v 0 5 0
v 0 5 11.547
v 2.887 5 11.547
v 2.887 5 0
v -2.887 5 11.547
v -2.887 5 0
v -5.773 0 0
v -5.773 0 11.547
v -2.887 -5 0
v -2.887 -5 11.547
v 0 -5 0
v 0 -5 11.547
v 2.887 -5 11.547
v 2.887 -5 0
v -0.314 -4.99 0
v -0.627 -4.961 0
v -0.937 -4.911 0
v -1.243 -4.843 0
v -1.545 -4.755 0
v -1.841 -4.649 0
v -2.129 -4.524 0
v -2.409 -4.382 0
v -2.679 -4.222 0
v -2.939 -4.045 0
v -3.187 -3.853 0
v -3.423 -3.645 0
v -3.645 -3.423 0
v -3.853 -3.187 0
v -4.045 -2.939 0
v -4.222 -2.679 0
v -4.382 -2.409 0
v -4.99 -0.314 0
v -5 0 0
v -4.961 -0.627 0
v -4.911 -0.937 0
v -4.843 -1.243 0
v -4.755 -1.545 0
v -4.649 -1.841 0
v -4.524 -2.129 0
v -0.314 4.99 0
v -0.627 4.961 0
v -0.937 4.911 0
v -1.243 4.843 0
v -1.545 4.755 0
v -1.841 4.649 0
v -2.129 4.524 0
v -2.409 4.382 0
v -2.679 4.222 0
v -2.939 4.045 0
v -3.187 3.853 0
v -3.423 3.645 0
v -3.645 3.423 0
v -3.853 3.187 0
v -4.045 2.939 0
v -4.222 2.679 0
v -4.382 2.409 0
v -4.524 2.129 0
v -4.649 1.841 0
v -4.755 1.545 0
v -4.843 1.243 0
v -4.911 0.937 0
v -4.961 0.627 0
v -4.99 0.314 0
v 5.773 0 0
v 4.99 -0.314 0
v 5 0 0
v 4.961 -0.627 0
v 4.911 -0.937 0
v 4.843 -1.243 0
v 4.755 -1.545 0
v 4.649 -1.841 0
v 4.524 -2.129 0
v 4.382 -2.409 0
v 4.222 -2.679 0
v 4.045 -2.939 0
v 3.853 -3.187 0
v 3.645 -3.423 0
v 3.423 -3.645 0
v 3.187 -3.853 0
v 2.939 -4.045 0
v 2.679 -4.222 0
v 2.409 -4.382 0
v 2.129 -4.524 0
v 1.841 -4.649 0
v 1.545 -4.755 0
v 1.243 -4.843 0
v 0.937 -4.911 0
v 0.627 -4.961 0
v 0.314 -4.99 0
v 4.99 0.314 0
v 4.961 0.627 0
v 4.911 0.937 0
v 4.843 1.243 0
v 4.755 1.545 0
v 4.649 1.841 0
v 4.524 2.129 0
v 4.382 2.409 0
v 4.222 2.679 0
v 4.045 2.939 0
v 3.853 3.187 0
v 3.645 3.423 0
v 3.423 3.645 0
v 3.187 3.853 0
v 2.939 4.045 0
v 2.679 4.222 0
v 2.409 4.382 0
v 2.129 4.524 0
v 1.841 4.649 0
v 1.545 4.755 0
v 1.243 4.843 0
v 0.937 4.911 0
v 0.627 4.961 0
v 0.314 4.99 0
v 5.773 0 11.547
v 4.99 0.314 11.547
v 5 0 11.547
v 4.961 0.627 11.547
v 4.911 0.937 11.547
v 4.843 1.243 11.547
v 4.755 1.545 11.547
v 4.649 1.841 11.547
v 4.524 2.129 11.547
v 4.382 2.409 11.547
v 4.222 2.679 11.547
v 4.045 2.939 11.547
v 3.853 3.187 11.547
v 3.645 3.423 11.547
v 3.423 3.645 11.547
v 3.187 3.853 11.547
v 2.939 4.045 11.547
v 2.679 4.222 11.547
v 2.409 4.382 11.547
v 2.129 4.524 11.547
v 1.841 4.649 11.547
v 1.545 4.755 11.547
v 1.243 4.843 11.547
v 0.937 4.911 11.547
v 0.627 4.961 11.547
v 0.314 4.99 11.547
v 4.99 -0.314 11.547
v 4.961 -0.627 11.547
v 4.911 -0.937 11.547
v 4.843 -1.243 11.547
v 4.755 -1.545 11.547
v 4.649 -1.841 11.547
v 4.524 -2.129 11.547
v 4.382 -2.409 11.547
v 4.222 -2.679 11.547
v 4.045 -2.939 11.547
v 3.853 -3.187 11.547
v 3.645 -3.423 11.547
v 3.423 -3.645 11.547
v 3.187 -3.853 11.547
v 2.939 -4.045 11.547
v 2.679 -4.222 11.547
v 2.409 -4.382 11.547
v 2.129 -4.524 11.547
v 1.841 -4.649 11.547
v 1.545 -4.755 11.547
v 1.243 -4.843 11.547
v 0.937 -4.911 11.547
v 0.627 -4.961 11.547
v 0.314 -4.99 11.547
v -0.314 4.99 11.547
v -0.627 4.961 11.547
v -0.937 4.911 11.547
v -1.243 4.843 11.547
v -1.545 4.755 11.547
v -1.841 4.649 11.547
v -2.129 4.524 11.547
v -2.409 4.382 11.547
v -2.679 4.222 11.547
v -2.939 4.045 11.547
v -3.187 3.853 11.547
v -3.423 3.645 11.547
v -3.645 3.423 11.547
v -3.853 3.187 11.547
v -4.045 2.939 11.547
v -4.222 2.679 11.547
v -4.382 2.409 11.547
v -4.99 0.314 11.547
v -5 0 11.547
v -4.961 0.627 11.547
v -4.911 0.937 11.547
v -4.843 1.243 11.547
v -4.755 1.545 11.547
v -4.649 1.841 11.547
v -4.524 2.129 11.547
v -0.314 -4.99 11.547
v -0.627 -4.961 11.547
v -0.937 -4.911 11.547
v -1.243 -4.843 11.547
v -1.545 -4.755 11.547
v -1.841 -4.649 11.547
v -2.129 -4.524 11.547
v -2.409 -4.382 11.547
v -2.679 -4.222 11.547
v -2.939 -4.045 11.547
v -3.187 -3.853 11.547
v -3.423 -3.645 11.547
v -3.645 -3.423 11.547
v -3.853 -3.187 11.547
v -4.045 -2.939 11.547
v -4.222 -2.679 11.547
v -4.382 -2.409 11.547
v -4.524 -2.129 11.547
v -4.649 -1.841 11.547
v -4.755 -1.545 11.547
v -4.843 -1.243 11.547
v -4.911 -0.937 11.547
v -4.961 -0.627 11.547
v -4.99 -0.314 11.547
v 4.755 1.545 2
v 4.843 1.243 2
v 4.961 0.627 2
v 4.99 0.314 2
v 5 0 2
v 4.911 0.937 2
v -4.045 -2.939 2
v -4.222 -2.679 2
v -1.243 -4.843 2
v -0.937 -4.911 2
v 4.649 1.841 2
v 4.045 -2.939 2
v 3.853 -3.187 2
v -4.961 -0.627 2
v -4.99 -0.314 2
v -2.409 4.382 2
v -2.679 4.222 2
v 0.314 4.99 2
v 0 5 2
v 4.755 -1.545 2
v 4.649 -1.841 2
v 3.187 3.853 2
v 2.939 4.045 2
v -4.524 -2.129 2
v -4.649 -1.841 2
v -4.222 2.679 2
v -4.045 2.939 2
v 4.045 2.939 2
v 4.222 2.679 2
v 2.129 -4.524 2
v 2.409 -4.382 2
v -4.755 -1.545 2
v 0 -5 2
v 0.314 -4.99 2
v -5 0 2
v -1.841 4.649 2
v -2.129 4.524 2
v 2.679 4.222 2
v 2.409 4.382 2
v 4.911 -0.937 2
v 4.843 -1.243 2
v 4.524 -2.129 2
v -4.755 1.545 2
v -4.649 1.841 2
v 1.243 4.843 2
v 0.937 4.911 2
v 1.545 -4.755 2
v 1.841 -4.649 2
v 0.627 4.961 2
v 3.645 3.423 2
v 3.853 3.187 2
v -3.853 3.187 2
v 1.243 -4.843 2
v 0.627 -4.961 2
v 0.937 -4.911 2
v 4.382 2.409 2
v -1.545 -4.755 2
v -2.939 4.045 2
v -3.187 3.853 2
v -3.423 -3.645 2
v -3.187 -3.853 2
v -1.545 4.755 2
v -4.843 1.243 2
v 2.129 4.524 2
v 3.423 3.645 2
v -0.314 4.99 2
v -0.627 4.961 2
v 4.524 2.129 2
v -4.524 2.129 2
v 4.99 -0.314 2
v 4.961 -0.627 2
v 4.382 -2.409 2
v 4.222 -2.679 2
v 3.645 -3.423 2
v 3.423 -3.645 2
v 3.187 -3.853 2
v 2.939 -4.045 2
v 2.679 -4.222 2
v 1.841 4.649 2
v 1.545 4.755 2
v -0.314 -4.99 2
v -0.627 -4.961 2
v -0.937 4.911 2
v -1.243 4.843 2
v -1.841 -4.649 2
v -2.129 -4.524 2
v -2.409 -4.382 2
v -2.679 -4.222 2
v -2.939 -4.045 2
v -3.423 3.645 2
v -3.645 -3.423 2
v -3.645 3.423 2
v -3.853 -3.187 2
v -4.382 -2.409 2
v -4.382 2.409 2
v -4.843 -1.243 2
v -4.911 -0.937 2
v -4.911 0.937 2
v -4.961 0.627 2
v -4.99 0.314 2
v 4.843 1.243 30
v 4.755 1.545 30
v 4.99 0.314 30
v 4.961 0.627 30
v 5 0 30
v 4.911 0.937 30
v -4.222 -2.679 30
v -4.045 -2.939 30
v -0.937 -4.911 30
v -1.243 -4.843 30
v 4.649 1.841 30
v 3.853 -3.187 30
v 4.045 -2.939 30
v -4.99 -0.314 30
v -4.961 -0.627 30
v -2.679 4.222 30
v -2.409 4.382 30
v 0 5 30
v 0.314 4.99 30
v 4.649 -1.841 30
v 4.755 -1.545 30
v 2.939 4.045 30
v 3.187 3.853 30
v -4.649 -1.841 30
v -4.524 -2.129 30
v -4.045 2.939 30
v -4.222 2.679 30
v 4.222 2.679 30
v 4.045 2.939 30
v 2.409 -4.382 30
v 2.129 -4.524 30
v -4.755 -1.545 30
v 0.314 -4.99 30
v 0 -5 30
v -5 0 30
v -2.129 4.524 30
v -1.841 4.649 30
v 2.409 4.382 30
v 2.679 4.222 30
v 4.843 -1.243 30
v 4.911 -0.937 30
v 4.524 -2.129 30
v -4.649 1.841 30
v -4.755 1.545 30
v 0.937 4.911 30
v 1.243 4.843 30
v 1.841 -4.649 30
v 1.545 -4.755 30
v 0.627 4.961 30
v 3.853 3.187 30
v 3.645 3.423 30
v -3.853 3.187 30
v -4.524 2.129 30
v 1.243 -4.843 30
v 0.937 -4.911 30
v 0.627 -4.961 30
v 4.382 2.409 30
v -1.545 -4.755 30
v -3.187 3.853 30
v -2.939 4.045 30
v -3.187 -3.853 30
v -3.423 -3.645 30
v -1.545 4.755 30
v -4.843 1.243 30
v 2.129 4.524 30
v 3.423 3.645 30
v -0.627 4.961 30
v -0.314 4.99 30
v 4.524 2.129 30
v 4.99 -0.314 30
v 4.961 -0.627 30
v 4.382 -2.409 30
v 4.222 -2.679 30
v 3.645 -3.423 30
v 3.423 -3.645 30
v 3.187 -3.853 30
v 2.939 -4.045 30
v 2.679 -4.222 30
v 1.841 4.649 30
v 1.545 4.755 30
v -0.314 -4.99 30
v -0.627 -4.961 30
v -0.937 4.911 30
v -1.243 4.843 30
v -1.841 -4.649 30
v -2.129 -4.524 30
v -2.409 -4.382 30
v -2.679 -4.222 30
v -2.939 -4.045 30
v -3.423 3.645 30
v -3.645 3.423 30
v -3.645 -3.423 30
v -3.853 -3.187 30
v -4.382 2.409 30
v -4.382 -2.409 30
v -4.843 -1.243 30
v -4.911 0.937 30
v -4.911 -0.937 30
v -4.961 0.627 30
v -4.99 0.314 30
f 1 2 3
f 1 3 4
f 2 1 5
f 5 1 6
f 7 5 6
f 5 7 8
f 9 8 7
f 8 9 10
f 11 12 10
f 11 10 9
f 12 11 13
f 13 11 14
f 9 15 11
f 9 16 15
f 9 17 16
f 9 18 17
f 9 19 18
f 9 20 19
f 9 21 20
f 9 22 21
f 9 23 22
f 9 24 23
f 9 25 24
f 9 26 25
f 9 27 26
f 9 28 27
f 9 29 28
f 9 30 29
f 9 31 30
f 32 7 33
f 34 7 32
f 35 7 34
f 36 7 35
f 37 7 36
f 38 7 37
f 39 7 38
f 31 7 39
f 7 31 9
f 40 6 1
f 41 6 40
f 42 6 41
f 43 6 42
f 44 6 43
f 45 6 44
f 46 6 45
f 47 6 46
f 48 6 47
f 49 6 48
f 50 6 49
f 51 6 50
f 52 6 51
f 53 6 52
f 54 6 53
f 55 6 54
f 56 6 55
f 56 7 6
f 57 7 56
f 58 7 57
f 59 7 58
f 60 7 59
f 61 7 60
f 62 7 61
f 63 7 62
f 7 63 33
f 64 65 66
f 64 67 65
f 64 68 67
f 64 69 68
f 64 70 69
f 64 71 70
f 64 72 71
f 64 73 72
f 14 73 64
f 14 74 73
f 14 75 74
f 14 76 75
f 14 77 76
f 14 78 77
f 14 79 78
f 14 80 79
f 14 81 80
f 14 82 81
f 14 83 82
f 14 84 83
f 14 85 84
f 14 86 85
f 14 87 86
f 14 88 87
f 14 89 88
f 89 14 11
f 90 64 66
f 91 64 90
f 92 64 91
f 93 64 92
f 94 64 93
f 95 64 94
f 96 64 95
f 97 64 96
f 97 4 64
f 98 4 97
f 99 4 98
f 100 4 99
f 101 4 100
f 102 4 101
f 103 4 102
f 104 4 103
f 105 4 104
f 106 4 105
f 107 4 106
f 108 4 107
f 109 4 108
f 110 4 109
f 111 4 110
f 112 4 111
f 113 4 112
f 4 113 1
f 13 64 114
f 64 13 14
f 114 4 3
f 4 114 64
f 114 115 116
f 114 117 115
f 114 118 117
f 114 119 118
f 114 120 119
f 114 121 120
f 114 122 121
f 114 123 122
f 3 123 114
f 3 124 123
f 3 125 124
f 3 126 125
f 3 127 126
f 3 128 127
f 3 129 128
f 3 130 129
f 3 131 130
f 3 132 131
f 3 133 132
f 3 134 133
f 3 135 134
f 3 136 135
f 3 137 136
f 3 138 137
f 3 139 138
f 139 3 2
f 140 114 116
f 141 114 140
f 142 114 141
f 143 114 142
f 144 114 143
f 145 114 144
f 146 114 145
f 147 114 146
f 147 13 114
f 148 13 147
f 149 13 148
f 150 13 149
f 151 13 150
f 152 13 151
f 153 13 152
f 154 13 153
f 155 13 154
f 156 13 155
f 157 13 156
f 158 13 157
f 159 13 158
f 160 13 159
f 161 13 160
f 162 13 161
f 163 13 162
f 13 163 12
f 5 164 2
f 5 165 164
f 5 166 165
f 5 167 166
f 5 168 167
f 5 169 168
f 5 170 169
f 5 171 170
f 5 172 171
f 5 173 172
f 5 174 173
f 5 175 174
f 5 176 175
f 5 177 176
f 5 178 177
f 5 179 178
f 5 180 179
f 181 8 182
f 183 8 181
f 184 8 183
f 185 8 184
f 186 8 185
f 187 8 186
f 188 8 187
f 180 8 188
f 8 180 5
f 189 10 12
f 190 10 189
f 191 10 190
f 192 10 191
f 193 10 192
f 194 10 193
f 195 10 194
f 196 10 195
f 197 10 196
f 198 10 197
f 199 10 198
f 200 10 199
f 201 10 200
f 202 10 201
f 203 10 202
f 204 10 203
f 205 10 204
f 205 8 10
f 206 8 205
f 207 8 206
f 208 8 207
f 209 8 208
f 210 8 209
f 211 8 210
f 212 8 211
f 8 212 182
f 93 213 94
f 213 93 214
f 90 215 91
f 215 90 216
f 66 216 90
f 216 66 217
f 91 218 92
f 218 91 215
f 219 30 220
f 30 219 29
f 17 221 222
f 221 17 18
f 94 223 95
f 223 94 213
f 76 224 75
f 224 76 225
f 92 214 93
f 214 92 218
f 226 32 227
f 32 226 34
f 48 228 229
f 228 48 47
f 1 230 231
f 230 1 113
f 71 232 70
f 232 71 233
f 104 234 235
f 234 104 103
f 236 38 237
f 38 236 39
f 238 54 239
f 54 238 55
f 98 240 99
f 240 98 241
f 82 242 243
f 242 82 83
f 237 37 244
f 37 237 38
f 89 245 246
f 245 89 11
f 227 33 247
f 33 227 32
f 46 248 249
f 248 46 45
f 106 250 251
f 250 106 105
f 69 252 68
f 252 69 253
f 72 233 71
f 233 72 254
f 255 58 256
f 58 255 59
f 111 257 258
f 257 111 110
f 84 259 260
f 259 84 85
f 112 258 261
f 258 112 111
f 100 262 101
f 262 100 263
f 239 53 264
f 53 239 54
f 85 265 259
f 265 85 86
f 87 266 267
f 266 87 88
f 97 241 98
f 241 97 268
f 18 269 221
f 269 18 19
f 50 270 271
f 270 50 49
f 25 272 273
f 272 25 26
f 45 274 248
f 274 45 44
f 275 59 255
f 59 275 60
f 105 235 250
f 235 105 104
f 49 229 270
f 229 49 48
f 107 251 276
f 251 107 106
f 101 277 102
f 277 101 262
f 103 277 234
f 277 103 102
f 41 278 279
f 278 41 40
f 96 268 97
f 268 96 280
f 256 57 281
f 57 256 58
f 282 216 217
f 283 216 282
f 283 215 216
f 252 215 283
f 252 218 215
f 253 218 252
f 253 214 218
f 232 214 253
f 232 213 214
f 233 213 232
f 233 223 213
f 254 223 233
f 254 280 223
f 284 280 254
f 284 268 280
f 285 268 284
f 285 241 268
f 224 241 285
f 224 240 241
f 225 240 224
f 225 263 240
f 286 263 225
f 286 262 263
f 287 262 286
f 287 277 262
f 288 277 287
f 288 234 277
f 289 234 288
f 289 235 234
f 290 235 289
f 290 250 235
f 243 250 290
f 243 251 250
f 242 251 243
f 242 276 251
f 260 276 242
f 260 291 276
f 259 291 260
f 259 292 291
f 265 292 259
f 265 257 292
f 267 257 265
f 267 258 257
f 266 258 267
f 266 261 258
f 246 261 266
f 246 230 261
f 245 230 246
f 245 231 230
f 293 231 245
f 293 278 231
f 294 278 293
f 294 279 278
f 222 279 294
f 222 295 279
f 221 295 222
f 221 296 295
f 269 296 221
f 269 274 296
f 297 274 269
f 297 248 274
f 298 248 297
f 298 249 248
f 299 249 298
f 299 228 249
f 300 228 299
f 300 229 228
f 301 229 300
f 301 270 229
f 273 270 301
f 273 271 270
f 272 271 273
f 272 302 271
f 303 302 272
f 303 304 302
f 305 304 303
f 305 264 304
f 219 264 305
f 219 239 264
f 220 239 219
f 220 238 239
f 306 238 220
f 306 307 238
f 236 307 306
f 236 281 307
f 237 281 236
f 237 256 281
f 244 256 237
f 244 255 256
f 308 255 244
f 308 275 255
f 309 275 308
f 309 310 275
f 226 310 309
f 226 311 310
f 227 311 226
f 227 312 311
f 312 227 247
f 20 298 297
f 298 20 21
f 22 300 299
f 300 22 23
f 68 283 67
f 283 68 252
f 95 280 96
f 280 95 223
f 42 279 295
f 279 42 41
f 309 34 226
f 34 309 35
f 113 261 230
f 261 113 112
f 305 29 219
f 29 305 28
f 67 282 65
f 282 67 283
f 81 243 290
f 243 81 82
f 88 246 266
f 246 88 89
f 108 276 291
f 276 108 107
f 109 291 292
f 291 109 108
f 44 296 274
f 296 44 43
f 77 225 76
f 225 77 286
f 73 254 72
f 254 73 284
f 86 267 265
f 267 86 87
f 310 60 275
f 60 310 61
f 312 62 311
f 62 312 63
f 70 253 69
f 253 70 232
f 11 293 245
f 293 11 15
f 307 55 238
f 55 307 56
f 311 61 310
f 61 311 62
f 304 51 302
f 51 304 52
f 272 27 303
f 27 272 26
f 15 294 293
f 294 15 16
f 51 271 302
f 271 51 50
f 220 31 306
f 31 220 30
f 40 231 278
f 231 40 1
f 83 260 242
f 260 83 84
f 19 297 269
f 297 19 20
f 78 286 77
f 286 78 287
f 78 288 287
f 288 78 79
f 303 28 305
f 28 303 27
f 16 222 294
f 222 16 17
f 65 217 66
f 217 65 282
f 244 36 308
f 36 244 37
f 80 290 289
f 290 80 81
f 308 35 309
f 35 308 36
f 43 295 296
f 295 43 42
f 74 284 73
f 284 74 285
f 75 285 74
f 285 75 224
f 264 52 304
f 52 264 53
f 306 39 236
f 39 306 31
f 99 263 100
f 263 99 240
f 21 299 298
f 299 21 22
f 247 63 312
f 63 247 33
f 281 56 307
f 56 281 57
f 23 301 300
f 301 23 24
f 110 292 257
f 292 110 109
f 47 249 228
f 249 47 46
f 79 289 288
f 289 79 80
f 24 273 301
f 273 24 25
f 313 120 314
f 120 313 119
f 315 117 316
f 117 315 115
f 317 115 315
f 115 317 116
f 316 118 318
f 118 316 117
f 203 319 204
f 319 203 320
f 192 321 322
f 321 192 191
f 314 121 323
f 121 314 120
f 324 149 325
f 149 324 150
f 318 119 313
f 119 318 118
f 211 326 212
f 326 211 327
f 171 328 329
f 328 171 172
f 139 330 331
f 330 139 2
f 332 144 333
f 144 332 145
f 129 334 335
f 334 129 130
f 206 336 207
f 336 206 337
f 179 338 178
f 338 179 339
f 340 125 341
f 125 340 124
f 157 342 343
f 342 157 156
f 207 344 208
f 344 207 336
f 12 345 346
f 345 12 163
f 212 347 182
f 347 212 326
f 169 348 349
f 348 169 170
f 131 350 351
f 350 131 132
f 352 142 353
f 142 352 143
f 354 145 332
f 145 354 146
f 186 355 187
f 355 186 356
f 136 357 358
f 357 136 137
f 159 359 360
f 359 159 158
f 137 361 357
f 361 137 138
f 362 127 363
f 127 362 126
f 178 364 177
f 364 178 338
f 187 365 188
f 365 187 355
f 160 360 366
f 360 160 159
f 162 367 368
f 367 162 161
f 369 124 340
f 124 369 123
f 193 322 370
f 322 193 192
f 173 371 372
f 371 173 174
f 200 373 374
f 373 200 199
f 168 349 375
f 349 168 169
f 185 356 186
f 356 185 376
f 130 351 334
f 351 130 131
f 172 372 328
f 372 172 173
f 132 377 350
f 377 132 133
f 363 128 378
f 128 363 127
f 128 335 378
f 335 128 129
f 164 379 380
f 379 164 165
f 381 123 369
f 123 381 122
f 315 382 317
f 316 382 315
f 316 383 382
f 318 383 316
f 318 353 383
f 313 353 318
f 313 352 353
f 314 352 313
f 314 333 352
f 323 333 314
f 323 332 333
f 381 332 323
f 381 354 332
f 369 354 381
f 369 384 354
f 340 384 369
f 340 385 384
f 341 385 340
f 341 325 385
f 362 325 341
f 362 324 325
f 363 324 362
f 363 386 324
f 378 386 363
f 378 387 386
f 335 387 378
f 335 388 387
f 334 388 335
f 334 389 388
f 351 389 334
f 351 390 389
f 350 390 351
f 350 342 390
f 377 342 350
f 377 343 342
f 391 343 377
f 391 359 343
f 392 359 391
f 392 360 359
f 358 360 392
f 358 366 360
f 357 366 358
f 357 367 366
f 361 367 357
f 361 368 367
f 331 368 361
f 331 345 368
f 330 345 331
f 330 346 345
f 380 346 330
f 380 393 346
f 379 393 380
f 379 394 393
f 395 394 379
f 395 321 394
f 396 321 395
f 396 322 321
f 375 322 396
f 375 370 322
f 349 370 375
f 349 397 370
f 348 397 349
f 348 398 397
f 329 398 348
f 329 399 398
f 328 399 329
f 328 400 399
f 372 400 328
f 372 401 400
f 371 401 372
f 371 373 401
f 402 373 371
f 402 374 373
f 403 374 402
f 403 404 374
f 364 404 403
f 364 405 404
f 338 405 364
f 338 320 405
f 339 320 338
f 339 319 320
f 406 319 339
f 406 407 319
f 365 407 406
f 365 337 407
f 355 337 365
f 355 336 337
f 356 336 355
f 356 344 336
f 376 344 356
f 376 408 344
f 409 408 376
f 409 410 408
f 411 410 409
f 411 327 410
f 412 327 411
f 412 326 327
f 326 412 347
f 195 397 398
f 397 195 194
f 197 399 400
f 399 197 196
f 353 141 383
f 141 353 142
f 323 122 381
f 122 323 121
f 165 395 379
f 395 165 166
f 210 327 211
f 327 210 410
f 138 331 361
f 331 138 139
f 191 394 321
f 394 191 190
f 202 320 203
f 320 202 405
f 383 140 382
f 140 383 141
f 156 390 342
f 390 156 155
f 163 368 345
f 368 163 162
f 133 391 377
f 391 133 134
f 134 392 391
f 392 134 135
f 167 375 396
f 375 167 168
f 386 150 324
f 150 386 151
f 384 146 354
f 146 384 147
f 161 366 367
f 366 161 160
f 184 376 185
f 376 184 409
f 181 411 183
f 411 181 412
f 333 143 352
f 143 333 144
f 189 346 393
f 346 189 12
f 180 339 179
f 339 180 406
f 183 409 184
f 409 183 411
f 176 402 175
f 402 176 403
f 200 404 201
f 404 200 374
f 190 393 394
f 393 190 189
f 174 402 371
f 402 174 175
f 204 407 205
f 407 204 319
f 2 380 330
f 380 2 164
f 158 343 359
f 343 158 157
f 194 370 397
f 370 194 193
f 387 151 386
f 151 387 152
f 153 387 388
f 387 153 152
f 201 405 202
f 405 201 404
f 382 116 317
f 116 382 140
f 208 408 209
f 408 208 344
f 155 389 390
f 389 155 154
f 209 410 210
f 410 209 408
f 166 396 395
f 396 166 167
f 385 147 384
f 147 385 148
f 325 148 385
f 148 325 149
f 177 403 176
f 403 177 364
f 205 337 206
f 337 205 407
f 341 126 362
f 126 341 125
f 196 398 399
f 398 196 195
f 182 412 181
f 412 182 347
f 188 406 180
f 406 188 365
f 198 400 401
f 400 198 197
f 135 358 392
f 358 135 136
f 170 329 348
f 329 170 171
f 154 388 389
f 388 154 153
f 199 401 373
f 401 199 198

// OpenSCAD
$fn=100; // Increase for smoother curves

module hexagonal_bolt(diameter, length) {
  hex_size = diameter / 2 / cos(30); // Calculate side length of hexagon
  
  // Bolt head
  difference() {
    linear_extrude(height = 2 * hex_size)
      polygon(points = [[hex_size, 0], [hex_size/2, hex_size * sin(60)], [-hex_size/2, hex_size * sin(60)], [-hex_size, 0], [-hex_size/2, -hex_size * sin(60)], [hex_size/2, -hex_size * sin(60)]]);
    translate([0,0,-0.1]) cylinder(h=2.1, r=diameter/2); //countersink
  }

  // Bolt shank
  translate([0, 0, 2 * hex_size])
    cylinder(h = length - 2 * hex_size, r = diameter / 2);
}


hexagonal_bolt(10, 30);
